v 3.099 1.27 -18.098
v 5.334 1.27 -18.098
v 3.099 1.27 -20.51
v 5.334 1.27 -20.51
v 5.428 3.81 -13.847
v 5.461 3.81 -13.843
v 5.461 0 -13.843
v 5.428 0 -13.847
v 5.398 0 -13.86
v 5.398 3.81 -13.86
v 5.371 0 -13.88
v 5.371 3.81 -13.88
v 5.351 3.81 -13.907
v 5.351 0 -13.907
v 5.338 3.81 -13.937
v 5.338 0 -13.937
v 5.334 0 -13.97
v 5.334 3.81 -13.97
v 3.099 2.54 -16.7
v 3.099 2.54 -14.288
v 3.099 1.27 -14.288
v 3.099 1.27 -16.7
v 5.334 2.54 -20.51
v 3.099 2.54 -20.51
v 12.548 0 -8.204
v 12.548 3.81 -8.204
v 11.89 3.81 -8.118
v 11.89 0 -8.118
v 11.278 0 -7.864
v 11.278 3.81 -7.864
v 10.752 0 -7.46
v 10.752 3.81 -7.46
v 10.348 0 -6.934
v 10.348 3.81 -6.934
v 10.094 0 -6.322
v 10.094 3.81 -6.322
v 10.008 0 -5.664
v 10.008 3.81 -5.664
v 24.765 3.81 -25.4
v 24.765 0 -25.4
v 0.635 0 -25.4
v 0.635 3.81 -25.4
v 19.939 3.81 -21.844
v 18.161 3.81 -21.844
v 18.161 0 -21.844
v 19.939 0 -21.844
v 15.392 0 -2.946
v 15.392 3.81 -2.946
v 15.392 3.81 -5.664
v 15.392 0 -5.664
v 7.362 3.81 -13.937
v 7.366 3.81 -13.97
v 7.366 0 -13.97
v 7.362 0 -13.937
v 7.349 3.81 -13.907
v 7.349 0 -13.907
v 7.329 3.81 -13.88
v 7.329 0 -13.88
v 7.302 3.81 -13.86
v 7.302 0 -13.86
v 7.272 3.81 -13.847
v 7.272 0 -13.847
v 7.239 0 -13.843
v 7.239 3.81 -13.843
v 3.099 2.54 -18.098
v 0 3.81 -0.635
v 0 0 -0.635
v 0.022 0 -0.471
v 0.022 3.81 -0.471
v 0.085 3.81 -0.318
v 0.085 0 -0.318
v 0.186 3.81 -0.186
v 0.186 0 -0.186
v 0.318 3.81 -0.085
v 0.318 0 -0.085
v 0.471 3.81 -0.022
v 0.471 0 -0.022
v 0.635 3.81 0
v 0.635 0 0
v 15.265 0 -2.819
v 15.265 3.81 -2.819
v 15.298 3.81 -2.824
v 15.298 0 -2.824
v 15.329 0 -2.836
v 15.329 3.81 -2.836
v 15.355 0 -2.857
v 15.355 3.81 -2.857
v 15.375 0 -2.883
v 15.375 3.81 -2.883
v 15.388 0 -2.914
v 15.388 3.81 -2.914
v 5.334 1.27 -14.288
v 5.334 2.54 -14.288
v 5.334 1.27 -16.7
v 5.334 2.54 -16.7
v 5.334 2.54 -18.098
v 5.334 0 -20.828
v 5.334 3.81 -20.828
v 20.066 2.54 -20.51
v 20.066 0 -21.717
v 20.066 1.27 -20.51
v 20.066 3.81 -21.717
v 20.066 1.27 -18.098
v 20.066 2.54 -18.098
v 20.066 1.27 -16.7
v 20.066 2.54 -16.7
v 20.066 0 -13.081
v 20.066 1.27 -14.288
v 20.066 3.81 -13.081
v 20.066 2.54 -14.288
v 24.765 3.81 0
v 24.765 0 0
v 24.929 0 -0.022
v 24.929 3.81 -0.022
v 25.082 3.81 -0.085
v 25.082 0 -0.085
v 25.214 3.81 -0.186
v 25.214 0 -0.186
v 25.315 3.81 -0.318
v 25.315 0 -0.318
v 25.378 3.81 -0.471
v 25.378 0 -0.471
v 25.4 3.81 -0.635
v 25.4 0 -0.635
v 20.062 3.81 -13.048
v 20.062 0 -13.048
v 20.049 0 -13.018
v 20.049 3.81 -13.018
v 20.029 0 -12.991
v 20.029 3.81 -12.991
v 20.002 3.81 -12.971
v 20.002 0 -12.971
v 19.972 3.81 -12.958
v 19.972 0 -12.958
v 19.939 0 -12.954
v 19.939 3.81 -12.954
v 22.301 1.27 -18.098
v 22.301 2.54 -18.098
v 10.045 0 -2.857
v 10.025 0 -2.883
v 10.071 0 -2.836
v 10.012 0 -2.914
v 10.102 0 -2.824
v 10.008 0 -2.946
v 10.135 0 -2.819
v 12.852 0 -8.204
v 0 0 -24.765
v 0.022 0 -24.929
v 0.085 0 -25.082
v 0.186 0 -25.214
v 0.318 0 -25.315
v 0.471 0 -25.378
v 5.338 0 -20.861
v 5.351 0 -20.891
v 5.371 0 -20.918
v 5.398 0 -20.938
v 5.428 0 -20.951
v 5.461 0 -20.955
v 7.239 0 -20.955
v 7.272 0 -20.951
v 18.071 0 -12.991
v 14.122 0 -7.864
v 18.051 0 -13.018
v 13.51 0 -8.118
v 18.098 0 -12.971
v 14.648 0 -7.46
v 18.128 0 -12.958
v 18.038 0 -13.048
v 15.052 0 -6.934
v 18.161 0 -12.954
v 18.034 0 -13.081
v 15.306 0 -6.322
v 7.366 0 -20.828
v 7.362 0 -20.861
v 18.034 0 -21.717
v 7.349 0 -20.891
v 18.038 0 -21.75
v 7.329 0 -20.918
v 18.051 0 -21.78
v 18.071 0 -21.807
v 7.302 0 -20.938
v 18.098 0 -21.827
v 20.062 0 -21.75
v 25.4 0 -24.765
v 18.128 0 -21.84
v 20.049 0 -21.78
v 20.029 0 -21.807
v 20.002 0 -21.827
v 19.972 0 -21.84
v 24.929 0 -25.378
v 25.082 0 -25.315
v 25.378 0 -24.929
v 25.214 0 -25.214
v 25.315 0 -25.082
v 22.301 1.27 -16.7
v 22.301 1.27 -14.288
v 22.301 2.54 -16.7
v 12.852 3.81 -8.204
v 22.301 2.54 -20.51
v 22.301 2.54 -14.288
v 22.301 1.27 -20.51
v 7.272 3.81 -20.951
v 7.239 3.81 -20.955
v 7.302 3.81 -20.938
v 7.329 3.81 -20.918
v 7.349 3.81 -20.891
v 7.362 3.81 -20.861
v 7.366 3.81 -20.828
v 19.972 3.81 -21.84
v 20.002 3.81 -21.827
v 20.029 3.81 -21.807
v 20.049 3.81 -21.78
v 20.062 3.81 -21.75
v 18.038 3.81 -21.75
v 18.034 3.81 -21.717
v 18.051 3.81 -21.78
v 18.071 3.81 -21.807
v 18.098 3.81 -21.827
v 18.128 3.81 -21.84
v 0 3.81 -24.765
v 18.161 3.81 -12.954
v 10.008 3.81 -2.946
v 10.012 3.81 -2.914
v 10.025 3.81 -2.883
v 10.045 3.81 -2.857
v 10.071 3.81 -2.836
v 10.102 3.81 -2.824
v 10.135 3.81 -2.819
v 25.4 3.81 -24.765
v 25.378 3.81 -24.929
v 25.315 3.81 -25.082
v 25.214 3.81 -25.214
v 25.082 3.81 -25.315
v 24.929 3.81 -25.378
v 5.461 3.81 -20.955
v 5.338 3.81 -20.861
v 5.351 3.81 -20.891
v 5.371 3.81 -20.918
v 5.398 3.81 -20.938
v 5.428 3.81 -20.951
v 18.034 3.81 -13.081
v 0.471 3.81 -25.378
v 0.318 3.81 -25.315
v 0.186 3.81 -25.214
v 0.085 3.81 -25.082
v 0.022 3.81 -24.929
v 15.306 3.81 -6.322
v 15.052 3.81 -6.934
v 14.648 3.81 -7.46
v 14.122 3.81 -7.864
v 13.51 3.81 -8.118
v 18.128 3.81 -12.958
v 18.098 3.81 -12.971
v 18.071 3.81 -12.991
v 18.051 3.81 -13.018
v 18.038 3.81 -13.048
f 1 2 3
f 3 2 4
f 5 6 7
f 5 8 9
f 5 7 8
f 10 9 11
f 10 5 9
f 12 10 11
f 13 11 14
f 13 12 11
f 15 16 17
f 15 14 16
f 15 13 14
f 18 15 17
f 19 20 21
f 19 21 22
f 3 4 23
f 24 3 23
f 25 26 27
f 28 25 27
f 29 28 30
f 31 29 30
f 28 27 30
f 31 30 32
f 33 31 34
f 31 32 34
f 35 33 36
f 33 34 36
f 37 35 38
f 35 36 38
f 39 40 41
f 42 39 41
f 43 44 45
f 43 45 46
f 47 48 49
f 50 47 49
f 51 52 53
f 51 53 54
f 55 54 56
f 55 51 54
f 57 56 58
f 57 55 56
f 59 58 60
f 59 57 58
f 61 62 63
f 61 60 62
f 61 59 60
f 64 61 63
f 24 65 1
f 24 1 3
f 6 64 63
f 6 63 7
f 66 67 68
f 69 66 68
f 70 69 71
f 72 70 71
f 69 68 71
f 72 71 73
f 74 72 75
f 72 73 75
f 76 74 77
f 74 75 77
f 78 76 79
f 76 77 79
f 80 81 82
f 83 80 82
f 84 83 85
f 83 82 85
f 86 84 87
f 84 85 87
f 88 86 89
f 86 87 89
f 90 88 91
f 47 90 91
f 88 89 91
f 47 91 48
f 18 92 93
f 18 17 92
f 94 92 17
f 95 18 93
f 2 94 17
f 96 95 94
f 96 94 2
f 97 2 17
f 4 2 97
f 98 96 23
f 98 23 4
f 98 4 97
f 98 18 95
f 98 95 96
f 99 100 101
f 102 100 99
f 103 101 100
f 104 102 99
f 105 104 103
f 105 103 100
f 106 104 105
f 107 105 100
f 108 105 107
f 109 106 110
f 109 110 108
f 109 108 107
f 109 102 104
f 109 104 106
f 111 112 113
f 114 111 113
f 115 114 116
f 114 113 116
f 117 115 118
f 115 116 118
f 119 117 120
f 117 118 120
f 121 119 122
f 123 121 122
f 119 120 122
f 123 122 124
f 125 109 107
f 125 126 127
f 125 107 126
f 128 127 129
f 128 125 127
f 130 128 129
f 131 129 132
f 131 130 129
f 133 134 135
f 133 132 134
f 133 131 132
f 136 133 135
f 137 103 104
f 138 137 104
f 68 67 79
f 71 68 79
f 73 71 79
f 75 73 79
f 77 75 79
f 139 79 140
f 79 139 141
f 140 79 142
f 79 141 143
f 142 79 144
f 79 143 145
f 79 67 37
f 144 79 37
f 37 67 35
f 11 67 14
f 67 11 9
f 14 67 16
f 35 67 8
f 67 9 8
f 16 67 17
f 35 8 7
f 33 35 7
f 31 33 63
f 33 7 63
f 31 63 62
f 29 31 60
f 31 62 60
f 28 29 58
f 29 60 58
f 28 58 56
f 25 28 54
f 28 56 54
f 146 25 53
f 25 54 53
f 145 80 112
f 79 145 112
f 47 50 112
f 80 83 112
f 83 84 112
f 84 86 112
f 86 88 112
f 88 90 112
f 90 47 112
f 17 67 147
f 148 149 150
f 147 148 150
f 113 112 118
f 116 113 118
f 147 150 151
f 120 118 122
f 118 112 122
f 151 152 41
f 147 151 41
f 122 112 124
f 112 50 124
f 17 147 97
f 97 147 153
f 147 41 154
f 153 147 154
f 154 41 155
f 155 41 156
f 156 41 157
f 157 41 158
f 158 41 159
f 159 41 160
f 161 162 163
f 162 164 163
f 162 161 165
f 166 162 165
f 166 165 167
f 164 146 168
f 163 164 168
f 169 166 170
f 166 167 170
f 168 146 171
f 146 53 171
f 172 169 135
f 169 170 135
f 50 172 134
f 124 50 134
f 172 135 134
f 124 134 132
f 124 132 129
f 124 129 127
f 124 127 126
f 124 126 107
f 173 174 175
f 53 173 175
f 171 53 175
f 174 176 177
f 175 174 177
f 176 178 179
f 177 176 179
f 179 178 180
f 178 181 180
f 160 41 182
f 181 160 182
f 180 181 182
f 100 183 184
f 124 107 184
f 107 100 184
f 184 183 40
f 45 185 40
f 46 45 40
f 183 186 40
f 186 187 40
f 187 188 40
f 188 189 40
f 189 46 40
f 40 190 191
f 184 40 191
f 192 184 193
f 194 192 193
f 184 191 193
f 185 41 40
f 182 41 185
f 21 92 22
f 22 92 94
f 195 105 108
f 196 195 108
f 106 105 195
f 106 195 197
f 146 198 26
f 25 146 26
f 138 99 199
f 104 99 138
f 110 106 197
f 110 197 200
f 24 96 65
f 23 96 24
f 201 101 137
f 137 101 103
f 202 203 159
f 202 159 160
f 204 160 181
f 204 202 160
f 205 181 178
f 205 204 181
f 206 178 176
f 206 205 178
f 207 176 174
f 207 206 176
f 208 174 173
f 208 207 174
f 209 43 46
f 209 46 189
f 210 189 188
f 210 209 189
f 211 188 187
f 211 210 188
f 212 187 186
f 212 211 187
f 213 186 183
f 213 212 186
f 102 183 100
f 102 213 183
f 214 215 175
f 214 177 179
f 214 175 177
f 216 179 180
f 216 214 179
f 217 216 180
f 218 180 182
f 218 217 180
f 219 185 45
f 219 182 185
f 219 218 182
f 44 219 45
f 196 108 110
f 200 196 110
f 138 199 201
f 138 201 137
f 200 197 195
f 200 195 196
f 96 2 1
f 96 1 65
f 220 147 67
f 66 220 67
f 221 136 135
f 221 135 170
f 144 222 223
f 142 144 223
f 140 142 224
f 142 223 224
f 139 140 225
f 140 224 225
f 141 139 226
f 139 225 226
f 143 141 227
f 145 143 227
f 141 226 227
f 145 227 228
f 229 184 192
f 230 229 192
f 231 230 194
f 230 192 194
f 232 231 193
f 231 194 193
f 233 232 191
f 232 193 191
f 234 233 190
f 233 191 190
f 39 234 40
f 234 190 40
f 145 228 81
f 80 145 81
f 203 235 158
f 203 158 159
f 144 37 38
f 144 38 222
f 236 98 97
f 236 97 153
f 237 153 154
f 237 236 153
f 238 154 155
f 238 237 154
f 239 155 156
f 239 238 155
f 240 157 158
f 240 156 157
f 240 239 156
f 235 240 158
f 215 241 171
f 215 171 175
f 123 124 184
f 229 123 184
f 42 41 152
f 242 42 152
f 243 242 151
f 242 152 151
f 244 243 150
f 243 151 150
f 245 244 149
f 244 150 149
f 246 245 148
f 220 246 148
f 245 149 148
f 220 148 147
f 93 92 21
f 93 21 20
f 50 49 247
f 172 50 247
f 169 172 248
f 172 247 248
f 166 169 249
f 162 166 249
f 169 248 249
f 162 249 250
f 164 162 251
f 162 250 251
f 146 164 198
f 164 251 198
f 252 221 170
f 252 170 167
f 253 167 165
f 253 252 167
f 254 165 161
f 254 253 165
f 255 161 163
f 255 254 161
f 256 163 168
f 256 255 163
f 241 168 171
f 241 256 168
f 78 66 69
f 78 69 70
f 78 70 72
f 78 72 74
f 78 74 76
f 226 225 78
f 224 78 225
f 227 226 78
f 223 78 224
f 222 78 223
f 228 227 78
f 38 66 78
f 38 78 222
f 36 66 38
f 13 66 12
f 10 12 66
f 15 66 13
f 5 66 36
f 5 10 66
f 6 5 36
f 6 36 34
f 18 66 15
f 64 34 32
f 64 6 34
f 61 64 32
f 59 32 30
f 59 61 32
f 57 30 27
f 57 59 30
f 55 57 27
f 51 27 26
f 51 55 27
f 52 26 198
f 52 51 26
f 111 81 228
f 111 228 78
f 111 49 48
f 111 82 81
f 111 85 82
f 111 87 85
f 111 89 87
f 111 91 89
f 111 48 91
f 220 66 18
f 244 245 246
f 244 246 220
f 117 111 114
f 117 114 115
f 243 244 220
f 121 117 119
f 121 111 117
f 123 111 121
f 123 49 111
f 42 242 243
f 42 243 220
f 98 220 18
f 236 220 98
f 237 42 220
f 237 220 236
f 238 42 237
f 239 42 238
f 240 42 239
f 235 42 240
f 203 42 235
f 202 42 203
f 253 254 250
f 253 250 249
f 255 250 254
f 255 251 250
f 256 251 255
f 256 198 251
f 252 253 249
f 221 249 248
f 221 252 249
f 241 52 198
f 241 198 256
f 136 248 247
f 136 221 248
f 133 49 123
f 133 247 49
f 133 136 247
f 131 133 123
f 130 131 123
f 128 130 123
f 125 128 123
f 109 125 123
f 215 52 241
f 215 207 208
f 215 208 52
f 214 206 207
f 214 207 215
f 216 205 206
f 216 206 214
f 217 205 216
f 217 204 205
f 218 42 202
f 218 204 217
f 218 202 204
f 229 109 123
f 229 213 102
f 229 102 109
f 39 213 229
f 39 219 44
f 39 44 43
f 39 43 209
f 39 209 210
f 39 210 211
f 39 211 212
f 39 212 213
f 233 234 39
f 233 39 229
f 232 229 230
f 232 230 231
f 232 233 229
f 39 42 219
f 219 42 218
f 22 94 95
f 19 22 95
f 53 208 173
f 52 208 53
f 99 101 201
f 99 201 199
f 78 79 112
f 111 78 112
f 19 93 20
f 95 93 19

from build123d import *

# Parameters (mm, degrees)
BOSS_EXTRUDE1_DEPTH = 3.81
CUT_EXTRUDE1_DEPTH  = 37.122515139
SKETCH4_W           = 2.413
SKETCH4_H           = 1.27
CUT_EXTRUDE2_DEPTH  = 2.2352
SKETCH6_W           = 2.413
SKETCH6_H           = 1.27
CUT_EXTRUDE3_DEPTH  = 2.2352


with BuildPart() as part:
    # Sketch1 → Boss-Extrude1 (new body)
    with BuildSketch(Plane(origin=(0, 0, 0), x_dir=(1, 0, 0), z_dir=(0, 1, 0))):
        with BuildLine():
            Line((0.635, 0), (24.765, 0))
            ThreePointArc((24.765, 0), (25.214012806, 0.185987194), (25.4, 0.635))
            Line((25.4, 0.635), (25.4, 24.765))
            ThreePointArc((25.4, 24.765), (25.214012806, 25.214012806), (24.765, 25.4))
            Line((24.765, 25.4), (0.635, 25.4))
            ThreePointArc((0.635, 25.4), (0.185987194, 25.214012806), (0, 24.765))
            Line((0, 24.765), (0, 0.635))
            ThreePointArc((0, 0.635), (0.185987194, 0.185987194), (0.635, 0))
        make_face()
    extrude(amount=BOSS_EXTRUDE1_DEPTH)

    # Sketch2 → Cut-Extrude1 (cut, through all)
    with BuildSketch(Plane(origin=(0, 3.81, 0), x_dir=(1, 0, 0), z_dir=(0, 1, 0))):
        with BuildLine():
            Line((10.1346, 2.8194), (15.2654, 2.8194))
            ThreePointArc((15.2654, 2.8194), (15.355202561, 2.856597439), (15.3924, 2.9464))
            Line((15.3924, 2.9464), (15.3924, 5.6642))
            ThreePointArc((15.3924, 5.6642), (14.648451224, 7.460251224), (12.8524, 8.2042))
            Line((12.8524, 8.2042), (12.5476, 8.2042))
            ThreePointArc((12.5476, 8.2042), (10.751548776, 7.460251224), (10.0076, 5.6642))
            Line((10.0076, 5.6642), (10.0076, 2.9464))
            ThreePointArc((10.0076, 2.9464), (10.044797439, 2.856597439), (10.1346, 2.8194))
        make_face()
        with BuildLine():
            Line((5.461, 20.955), (7.239, 20.955))
            ThreePointArc((7.239, 20.955), (7.328802561, 20.917802561), (7.366, 20.828))
            Line((7.366, 20.828), (7.366, 13.97))
            ThreePointArc((7.366, 13.97), (7.328802561, 13.880197439), (7.239, 13.843))
            Line((7.239, 13.843), (5.461, 13.843))
            ThreePointArc((5.461, 13.843), (5.371197439, 13.880197439), (5.334, 13.97))
            Line((5.334, 13.97), (5.334, 14.2875))
            Line((5.334, 14.2875), (5.334, 16.7005))
            Line((5.334, 16.7005), (5.334, 18.0975))
            Line((5.334, 18.0975), (5.334, 20.5105))
            Line((5.334, 20.5105), (5.334, 20.828))
            ThreePointArc((5.334, 20.828), (5.371197439, 20.917802561), (5.461, 20.955))
        make_face()
        with BuildLine():
            Line((18.161, 21.844), (19.939, 21.844))
            ThreePointArc((19.939, 21.844), (20.028802561, 21.806802561), (20.066, 21.717))
            Line((20.066, 21.717), (20.066, 20.5105))
            Line((20.066, 20.5105), (20.066, 18.0975))
            Line((20.066, 18.0975), (20.066, 16.7005))
            Line((20.066, 16.7005), (20.066, 14.2875))
            Line((20.066, 14.2875), (20.066, 13.081))
            ThreePointArc((20.066, 13.081), (20.028802561, 12.991197439), (19.939, 12.954))
            Line((19.939, 12.954), (18.161, 12.954))
            ThreePointArc((18.161, 12.954), (18.071197439, 12.991197439), (18.034, 13.081))
            Line((18.034, 13.081), (18.034, 21.717))
            ThreePointArc((18.034, 21.717), (18.071197439, 21.806802561), (18.161, 21.844))
        make_face()
    extrude(amount=-CUT_EXTRUDE1_DEPTH, mode=Mode.SUBTRACT)

    # Sketch4 → Cut-Extrude2 (cut)
    with BuildSketch(Plane(origin=(5.334, 0, 0), x_dir=(0, 0, -1), z_dir=(1, 0, 0))):
        with Locations((15.494, 1.905)):
            Rectangle(SKETCH4_W, SKETCH4_H)
        with Locations((19.304, 1.905)):
            Rectangle(SKETCH4_W, SKETCH4_H)
    extrude(amount=-CUT_EXTRUDE2_DEPTH, mode=Mode.SUBTRACT)

    # Sketch6 → Cut-Extrude3 (cut)
    with BuildSketch(Plane.ZY.offset(-20.066)):
        with Locations((-15.494, 1.905)):
            Rectangle(SKETCH6_W, SKETCH6_H)
        with Locations((-19.304, 1.905)):
            Rectangle(SKETCH6_W, SKETCH6_H)
    extrude(amount=-CUT_EXTRUDE3_DEPTH, mode=Mode.SUBTRACT)


solid = part.part
